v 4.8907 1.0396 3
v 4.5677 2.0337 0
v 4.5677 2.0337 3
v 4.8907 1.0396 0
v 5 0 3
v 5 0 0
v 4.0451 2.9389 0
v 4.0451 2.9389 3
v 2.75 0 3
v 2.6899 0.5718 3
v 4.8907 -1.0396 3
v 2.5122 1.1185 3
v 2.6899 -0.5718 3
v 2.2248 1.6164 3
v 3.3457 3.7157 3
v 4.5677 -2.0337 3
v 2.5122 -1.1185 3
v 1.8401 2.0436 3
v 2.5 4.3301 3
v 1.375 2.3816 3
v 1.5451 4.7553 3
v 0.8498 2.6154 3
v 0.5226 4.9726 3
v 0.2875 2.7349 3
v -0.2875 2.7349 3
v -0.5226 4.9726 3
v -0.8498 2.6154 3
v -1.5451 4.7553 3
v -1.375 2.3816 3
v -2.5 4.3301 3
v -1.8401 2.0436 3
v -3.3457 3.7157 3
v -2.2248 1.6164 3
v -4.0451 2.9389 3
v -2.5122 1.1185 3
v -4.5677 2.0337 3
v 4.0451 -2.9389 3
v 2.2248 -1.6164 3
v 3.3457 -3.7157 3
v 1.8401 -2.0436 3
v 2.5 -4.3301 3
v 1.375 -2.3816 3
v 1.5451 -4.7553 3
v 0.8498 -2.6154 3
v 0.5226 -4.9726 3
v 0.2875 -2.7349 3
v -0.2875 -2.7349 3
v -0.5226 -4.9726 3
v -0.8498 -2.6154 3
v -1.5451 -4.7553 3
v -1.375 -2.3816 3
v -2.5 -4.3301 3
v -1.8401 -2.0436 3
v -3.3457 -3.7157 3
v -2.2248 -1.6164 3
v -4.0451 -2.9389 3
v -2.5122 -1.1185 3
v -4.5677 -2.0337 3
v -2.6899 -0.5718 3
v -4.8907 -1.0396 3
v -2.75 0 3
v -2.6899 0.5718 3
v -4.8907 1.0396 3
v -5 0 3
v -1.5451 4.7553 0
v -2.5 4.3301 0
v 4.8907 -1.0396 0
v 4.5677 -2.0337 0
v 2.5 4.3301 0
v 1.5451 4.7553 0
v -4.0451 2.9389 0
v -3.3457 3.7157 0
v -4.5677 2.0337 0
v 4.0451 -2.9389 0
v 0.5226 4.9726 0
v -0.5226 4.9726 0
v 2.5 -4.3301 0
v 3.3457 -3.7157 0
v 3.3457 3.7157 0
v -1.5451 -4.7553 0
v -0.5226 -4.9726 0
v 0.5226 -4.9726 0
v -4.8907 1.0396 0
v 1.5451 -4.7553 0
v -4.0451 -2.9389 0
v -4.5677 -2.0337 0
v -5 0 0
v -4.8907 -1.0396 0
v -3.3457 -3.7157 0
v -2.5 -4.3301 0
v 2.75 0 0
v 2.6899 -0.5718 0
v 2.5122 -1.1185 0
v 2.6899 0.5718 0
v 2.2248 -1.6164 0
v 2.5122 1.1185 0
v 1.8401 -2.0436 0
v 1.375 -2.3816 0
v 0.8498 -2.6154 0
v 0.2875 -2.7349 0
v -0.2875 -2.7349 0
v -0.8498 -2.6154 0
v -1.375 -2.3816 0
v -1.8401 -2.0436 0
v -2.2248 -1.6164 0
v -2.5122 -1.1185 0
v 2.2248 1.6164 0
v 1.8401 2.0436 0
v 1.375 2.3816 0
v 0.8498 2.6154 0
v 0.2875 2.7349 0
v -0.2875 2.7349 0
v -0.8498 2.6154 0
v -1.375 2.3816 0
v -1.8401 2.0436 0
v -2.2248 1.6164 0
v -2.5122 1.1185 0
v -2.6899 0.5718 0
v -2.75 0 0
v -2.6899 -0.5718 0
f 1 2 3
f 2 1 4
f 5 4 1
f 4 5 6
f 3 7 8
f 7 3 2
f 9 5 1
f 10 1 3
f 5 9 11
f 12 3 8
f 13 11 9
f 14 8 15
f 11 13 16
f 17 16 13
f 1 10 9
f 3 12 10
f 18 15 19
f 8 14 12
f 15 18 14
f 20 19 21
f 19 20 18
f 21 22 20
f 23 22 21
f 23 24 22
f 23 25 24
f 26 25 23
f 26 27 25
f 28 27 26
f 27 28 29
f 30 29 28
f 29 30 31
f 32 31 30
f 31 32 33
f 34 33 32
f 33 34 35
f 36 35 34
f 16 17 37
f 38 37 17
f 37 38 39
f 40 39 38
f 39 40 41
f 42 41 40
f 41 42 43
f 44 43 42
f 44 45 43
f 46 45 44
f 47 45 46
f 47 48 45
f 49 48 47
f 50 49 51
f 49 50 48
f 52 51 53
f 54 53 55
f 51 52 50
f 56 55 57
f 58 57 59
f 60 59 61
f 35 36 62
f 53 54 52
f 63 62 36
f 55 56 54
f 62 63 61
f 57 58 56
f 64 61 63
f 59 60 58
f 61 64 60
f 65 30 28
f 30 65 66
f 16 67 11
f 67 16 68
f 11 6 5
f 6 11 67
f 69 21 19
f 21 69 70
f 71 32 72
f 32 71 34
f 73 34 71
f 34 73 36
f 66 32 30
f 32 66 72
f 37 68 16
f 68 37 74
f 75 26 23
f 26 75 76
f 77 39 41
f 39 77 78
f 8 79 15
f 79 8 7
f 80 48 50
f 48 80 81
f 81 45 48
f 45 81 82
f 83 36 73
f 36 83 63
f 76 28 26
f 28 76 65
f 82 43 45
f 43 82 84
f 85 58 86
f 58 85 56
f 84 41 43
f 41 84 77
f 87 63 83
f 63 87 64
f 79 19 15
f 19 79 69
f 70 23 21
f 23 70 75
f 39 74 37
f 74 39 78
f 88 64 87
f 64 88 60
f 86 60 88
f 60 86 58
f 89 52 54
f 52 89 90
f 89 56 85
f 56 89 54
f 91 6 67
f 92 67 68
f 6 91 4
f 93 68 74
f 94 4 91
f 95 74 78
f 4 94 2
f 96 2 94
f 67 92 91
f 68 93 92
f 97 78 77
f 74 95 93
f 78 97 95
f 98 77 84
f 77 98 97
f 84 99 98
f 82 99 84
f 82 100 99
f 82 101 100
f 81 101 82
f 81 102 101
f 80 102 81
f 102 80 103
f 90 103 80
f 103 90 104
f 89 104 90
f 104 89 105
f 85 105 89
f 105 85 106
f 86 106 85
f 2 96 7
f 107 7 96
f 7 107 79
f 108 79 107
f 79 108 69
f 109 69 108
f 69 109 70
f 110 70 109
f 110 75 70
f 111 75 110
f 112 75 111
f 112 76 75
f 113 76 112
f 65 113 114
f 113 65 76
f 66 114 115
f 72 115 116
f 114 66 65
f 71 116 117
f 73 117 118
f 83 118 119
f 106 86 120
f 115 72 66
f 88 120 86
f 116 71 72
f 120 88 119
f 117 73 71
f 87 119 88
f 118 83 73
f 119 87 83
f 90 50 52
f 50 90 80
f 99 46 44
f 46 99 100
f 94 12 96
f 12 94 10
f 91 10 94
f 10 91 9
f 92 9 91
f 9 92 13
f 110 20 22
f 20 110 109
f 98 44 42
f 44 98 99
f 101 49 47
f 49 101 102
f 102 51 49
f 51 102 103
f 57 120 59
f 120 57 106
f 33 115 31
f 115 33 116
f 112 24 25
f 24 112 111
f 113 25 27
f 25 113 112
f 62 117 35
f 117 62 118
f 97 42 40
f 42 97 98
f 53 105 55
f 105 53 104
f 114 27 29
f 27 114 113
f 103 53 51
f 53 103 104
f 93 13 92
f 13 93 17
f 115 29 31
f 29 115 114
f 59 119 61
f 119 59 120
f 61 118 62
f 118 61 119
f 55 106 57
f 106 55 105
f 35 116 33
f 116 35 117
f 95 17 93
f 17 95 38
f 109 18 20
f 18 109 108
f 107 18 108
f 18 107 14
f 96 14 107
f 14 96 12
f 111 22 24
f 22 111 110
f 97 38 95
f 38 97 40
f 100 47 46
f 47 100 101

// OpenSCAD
// file: hexnut.scad
module hexnut(flats=10, depth=5){
  sliceangle = 360 / 6;
  pointradius = flats / (2 * cos(sliceangle/2));
  flatoffset = flats * tan(sliceangle/2) / 2;
  union(){
    for(angle=[0:sliceangle:360]) {
      rotate(angle,[0,0,1]) linear_extrude(height=depth) polygon(points=[[0,-1],[flatoffset,flats/2],[-flatoffset,flats/2]],paths=[[0,1,2]]);
    }
  }
}
// main file
use<hexnut.scad>

$fn = 30;

module washer(inner_radius = 1.3, outer_radius = 5, thickness = 4, nut = [5,2]) {
    difference() {
        cylinder(r = outer_radius, h = thickness);
        union() {
            cylinder(r = inner_radius, h = thickness);
            if(0 != nut[0] && 0 != nut[1]) {
                translate([0, 0, thickness - 2]) hexnut(flats = 5, depth=2);
            }
        }
    }
}

washer(thickness = 3, inner_radius = 5.5 / 2, nut = [0, 0]);
